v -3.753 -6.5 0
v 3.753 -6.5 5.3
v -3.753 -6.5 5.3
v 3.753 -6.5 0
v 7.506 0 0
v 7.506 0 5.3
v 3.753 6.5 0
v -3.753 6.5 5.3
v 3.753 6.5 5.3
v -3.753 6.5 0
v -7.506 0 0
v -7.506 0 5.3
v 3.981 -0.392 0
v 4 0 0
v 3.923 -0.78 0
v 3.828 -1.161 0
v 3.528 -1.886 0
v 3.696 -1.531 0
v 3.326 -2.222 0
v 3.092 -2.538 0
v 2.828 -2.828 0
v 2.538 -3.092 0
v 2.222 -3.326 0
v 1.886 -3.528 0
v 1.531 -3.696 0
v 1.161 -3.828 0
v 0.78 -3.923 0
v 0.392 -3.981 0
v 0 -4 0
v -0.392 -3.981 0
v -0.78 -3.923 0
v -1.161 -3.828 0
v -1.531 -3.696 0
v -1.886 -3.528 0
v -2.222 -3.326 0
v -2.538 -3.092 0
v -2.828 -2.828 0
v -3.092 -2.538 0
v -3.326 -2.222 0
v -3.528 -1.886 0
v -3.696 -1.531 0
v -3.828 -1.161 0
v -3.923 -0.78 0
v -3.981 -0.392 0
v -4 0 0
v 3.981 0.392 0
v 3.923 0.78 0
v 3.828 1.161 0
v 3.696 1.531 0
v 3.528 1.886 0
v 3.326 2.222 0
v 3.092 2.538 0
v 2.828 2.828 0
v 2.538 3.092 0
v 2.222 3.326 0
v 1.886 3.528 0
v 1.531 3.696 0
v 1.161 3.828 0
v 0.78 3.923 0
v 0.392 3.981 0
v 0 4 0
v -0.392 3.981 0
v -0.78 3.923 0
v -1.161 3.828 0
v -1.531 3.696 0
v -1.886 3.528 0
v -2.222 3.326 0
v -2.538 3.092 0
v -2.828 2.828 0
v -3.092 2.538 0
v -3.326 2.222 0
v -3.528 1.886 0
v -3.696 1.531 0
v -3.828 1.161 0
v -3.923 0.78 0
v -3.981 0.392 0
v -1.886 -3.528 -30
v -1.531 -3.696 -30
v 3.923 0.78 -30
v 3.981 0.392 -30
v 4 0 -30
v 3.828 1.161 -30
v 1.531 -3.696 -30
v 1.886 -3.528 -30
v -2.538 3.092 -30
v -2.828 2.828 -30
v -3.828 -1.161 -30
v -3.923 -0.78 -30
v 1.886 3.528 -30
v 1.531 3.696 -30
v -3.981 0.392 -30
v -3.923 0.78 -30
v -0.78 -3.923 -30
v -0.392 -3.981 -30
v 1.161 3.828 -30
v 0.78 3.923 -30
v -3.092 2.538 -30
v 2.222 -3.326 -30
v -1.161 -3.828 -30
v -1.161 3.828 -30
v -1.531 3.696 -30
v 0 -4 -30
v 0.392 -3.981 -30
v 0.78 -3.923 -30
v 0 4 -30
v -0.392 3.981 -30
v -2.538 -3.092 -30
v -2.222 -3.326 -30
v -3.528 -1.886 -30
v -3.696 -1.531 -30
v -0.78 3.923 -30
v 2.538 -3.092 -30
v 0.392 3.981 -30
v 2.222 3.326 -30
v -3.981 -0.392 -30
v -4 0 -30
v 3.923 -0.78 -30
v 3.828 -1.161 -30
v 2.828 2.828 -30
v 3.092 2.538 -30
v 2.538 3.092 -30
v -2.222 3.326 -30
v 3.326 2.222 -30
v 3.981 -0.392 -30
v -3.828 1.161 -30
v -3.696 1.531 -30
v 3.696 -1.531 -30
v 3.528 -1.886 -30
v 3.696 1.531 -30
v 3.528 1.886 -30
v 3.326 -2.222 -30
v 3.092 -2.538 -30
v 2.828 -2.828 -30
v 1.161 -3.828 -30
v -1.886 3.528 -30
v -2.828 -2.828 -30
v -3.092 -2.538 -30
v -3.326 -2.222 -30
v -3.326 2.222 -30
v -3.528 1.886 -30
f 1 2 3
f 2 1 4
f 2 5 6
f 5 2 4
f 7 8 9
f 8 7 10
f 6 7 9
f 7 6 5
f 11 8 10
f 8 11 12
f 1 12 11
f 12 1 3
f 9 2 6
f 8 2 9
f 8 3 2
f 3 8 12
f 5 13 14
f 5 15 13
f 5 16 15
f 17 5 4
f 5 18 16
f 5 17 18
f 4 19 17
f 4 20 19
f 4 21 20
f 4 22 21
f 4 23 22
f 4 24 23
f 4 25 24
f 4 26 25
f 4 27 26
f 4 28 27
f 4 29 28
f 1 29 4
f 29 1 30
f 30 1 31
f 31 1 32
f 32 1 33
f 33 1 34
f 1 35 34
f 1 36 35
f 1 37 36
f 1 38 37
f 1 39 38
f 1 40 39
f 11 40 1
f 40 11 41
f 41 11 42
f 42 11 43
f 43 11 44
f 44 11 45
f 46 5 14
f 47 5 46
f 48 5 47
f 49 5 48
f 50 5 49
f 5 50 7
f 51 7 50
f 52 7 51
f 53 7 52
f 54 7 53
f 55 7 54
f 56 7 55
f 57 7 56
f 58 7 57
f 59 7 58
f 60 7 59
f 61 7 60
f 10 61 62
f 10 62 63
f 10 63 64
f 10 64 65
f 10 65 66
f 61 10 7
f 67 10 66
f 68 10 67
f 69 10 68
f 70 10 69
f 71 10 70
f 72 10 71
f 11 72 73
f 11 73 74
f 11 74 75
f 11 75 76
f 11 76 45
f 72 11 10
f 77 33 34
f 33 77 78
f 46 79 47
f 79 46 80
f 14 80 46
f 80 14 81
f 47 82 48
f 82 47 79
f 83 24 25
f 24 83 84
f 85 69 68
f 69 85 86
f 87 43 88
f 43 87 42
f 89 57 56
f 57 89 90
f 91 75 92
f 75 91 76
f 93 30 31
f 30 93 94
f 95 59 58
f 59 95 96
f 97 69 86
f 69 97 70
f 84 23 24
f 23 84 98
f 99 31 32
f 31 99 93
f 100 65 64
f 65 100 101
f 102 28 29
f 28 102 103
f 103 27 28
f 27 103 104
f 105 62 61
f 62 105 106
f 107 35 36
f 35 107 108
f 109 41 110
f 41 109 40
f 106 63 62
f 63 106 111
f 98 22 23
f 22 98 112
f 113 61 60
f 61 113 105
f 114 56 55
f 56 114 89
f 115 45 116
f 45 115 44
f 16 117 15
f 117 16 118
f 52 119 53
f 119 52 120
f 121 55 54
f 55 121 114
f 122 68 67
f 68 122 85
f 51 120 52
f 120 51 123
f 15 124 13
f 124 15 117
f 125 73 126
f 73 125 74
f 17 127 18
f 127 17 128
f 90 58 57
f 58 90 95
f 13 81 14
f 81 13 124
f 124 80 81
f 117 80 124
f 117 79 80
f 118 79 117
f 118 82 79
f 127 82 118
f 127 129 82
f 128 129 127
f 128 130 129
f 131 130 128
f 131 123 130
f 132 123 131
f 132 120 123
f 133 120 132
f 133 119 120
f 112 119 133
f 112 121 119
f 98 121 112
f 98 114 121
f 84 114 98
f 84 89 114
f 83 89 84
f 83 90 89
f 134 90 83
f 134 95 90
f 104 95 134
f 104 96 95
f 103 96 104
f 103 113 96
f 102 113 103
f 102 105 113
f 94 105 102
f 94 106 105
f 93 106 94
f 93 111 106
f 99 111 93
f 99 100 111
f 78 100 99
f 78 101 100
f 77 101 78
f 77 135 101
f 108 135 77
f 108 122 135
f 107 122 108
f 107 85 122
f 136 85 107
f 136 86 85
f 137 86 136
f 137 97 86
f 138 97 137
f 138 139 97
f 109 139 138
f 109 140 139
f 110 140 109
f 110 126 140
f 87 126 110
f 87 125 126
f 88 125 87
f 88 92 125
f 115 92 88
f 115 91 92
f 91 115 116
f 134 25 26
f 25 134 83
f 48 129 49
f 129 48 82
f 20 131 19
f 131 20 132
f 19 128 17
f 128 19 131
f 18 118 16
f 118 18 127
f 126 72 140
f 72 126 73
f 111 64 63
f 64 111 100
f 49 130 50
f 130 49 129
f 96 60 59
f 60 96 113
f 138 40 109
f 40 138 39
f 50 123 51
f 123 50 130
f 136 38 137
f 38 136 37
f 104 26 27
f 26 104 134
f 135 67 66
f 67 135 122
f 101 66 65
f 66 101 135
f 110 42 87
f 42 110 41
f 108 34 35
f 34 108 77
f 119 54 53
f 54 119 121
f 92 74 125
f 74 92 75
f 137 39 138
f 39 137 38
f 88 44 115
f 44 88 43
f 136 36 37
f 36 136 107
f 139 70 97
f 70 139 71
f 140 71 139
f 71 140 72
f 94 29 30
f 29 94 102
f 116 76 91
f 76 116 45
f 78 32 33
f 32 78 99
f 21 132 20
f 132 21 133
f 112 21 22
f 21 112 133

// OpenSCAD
// M8 hex bolt (thread omitted)
union() {
    // Hex head: 13 mm across flats, 5.3 mm high
    cylinder(h = 5.3, d = 13 / cos(30), $fn = 6);

    // Shank: 8 mm diameter, extending 30 mm below the head
    translate([0, 0, -30])
        cylinder(h = 30, d = 8, $fn = 64);
}
